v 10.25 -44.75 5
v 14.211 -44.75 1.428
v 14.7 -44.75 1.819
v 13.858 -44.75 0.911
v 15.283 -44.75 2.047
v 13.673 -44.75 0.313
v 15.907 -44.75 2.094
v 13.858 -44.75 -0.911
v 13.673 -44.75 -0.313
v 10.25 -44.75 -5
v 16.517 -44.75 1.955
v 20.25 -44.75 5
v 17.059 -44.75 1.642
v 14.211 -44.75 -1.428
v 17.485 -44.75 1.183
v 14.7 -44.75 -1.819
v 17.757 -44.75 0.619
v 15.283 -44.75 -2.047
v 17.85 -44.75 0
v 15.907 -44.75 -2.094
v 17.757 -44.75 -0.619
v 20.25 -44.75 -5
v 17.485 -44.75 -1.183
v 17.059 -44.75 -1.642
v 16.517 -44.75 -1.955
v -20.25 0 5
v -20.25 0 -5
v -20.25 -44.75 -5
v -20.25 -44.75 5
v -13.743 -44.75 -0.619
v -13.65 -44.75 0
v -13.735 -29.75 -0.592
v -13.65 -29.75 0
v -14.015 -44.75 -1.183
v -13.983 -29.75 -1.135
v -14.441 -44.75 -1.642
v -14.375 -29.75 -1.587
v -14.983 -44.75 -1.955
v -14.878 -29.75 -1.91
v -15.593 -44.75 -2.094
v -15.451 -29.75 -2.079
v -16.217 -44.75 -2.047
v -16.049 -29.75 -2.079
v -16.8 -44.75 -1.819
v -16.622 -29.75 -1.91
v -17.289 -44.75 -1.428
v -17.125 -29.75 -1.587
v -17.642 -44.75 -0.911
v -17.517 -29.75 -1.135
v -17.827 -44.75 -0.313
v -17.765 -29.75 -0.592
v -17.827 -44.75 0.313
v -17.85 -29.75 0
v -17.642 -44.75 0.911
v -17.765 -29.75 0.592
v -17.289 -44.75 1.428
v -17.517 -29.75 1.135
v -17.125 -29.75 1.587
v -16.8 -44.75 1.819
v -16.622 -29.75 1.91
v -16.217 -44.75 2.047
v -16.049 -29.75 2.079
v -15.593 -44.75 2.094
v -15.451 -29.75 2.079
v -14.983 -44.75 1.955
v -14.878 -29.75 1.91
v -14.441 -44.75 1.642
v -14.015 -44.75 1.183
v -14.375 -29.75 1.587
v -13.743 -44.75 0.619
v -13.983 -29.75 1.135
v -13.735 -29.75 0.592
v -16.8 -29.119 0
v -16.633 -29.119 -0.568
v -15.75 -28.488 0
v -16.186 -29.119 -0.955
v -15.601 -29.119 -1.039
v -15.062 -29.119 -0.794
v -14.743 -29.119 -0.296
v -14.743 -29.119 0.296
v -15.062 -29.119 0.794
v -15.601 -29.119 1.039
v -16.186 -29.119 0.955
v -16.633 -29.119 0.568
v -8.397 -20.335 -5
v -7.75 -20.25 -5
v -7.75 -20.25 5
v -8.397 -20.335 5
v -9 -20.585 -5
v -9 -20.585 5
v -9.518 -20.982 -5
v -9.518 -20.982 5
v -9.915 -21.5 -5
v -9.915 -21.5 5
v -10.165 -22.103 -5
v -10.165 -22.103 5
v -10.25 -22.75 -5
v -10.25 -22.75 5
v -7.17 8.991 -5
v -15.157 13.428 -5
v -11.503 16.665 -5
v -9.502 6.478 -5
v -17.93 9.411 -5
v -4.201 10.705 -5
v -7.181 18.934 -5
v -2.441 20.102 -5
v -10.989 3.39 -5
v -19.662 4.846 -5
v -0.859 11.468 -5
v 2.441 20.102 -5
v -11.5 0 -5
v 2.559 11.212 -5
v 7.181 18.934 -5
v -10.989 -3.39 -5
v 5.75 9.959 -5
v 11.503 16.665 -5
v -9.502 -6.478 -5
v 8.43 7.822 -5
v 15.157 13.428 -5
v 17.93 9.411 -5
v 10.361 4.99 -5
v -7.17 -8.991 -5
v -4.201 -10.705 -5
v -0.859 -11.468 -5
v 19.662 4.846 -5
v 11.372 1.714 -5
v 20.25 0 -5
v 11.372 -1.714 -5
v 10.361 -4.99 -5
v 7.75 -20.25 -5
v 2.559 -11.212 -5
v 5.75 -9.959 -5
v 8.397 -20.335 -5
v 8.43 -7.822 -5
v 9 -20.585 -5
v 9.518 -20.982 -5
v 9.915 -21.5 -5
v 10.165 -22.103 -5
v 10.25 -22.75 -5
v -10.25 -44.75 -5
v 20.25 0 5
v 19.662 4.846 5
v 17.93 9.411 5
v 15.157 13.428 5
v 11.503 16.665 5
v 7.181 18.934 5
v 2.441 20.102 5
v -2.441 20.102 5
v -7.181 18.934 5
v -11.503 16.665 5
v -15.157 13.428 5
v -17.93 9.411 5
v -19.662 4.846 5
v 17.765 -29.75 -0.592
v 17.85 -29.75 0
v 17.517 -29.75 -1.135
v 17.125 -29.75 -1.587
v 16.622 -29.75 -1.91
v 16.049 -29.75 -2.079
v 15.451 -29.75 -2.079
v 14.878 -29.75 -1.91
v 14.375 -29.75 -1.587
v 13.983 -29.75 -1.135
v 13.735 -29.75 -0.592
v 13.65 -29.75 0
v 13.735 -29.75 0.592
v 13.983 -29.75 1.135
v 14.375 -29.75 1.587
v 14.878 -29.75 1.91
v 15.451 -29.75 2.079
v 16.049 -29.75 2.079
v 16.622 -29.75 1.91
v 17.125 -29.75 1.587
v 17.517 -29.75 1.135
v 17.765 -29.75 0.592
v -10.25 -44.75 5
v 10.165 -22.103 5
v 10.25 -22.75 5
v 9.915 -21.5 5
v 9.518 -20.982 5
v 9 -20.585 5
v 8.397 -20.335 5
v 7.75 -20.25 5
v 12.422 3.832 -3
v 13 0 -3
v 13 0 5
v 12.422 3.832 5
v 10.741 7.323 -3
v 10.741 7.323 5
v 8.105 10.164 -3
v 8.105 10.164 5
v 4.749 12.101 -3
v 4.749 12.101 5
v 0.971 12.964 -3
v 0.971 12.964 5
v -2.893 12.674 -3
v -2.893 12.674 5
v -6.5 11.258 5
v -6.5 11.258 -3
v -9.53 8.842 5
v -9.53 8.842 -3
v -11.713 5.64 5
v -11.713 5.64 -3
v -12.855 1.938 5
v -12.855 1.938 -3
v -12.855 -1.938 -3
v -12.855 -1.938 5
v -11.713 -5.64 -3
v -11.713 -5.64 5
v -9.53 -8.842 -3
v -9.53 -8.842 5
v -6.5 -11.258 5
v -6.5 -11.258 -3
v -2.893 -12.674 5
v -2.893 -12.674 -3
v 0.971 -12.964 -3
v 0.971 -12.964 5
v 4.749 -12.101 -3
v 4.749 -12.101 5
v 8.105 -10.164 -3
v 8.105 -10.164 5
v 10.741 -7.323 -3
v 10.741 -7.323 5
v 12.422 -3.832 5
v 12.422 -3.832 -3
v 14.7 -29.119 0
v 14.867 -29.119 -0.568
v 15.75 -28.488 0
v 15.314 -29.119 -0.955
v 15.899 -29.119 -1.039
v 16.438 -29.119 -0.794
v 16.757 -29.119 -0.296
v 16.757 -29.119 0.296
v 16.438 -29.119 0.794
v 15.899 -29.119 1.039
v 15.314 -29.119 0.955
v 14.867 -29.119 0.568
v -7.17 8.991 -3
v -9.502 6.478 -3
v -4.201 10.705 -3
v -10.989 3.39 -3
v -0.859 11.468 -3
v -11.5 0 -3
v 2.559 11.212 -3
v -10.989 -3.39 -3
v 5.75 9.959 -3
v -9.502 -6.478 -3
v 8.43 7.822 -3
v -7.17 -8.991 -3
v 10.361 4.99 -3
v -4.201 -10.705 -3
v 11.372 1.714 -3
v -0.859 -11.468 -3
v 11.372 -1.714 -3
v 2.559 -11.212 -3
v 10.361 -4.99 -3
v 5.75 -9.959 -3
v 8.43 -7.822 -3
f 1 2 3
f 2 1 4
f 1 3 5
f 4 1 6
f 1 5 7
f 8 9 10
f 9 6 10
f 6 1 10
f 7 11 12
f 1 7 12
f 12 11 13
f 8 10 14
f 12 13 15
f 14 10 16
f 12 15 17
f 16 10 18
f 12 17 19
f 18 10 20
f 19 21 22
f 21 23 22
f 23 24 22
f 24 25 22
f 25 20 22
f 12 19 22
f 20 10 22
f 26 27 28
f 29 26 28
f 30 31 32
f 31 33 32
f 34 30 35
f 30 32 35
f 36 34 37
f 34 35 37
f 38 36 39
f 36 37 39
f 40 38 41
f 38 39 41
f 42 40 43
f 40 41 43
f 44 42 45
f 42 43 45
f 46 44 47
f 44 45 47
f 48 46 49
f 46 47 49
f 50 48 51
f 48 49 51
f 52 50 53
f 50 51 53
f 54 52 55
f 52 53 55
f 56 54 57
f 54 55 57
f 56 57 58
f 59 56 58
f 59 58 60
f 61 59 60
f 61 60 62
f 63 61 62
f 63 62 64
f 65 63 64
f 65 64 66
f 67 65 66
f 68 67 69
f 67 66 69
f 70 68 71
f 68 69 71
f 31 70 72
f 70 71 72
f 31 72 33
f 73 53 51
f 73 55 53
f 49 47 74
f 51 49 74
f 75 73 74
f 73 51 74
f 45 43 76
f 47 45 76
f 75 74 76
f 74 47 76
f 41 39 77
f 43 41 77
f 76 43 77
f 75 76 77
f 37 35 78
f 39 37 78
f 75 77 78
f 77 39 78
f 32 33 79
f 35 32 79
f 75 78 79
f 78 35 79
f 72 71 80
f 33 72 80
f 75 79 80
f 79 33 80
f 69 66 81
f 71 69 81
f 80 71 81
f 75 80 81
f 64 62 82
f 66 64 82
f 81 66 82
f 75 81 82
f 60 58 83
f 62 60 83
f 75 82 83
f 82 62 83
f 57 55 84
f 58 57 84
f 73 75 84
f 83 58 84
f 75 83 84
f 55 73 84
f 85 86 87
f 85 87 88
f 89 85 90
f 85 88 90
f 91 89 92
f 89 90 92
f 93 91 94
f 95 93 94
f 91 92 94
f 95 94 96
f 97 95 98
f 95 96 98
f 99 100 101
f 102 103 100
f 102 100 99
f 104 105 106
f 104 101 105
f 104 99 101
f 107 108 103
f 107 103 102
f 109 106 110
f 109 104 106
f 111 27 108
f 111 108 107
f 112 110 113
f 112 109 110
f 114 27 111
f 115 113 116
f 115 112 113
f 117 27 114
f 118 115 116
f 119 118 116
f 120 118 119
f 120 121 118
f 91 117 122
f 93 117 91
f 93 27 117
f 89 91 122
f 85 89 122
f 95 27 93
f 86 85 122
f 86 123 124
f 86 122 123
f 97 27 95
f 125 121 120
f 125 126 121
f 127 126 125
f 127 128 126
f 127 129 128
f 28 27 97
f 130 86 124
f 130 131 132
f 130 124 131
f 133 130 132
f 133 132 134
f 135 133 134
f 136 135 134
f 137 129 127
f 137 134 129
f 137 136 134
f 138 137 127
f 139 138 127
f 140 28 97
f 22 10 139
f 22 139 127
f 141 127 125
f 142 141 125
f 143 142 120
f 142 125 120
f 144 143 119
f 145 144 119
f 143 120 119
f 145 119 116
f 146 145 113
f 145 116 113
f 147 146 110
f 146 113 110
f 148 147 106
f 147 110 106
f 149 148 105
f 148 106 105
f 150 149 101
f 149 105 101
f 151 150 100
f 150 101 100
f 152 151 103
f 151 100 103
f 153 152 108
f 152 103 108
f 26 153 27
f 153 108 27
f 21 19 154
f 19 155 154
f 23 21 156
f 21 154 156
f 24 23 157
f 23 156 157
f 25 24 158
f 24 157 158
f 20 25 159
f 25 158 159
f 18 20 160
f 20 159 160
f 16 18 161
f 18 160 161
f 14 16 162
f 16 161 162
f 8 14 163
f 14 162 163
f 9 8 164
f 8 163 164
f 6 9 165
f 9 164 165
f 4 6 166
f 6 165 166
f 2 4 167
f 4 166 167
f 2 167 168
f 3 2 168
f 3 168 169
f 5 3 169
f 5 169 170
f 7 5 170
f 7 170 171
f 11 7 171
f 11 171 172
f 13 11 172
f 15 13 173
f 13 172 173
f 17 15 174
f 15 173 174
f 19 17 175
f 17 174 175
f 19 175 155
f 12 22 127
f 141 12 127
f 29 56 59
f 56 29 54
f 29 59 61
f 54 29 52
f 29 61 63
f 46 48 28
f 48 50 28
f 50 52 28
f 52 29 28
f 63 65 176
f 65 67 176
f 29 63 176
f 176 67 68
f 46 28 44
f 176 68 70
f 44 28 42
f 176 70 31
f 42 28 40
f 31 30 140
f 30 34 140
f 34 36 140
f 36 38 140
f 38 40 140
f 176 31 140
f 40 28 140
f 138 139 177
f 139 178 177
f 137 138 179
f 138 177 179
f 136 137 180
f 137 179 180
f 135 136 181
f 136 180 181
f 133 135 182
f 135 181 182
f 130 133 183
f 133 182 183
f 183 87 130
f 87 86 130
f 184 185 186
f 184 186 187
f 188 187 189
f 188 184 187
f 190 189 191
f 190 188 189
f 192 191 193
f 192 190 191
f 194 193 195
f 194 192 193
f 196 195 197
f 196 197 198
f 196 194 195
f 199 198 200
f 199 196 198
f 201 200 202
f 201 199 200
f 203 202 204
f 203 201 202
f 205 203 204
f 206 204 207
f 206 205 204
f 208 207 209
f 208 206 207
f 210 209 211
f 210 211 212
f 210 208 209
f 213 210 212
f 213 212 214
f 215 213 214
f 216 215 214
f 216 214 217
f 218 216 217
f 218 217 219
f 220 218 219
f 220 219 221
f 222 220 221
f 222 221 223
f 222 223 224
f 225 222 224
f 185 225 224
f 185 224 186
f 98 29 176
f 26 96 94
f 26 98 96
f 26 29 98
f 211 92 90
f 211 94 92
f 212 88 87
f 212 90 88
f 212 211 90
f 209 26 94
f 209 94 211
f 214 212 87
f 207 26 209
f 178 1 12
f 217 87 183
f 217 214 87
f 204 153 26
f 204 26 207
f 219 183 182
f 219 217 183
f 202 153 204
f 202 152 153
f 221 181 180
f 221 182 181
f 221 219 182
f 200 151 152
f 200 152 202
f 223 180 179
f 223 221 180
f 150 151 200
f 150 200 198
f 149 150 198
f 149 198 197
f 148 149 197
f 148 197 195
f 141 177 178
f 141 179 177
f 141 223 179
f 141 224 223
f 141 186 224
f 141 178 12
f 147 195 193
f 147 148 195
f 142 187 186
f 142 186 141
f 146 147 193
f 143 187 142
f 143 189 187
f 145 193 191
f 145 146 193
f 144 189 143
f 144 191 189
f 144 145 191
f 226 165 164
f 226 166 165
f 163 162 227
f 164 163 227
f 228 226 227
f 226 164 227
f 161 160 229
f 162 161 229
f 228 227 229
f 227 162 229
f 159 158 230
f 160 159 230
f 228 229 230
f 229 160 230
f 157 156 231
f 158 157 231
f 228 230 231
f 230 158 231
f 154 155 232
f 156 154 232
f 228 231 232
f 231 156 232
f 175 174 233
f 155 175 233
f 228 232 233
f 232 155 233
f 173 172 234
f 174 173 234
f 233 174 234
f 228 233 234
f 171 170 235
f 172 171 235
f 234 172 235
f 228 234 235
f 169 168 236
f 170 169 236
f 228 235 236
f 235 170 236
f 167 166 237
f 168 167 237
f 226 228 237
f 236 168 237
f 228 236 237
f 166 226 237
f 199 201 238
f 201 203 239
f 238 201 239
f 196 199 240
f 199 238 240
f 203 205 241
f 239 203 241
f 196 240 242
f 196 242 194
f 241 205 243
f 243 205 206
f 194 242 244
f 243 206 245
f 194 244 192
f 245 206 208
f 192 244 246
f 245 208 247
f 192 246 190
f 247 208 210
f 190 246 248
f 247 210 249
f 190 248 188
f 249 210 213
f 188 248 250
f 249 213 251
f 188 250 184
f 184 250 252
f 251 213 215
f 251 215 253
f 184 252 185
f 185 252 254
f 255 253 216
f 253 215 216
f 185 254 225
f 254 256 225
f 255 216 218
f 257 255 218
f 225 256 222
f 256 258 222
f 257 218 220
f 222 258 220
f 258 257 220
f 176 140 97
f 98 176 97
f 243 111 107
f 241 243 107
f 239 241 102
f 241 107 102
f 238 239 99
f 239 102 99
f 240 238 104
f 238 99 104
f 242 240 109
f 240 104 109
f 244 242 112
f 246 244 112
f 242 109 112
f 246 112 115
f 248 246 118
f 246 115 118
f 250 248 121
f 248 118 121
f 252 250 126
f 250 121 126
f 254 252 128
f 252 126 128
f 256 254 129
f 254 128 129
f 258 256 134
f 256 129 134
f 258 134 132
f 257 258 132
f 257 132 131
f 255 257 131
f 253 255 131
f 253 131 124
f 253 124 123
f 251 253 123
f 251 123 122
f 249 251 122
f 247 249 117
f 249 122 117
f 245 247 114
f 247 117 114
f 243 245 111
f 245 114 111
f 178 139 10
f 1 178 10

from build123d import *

# Parameters (mm, degrees)
BOSS_EXTRUDE1_DEPTH       = 5
BOSS_EXTRUDE1_DEPTH_BACK  = 5
SKETCH1_R                 = 13
SKETCH2_R                 = 13
SKETCH2_R_2               = 11.5
BOSS_EXTRUDE2_DEPTH       = 2
M5X0_8_TAPPED_HOLE1_D     = 4.2
M5X0_8_TAPPED_HOLE1_DEPTH = 15
M5X0_8_TAPPED_HOLE1_TIP   = 1.2618073
FILLET1_R                 = 2.5


with BuildPart() as part:
    # Sketch1 → Boss-Extrude1 (new, two sides: drawn at the far end of the back side and taken through both)
    with BuildSketch(Plane.XY.offset(-BOSS_EXTRUDE1_DEPTH_BACK)):
        with BuildLine():
            Line((-10.25, -20.25), (10.25, -20.25))
            Line((10.25, -20.25), (10.25, -44.75))
            Line((10.25, -44.75), (20.25, -44.75))
            Line((20.25, -44.75), (20.25, 0))
            ThreePointArc((20.25, 0), (0, 20.25), (-20.25, 0))
            Line((-20.25, 0), (-20.25, -44.75))
            Line((-20.25, -44.75), (-10.25, -44.75))
            Line((-10.25, -44.75), (-10.25, -20.25))
        make_face()
        Circle(SKETCH1_R, mode=Mode.SUBTRACT)
    extrude(amount=BOSS_EXTRUDE1_DEPTH + BOSS_EXTRUDE1_DEPTH_BACK)

    # Sketch2 → Boss-Extrude2 (add)
    with BuildSketch(Plane(origin=(0, 0, -5), x_dir=(-1, 0, 0), z_dir=(0, 0, -1))):
        Circle(SKETCH2_R)
        Circle(SKETCH2_R_2, mode=Mode.SUBTRACT)
    extrude(amount=-BOSS_EXTRUDE2_DEPTH)

    # M5x0.8 Tapped Hole1
    with Locations(Plane(origin=(0, -44.75, 0), x_dir=(-1, 0, 0), z_dir=(0, -1, 0))):
        with Locations((15.75, 0), (-15.75, 0)):
            Hole(M5X0_8_TAPPED_HOLE1_D / 2, depth=M5X0_8_TAPPED_HOLE1_DEPTH)
            with Locations((0, 0, -(M5X0_8_TAPPED_HOLE1_DEPTH + M5X0_8_TAPPED_HOLE1_TIP / 2))):  # 118° drill point
                Cone(0, M5X0_8_TAPPED_HOLE1_D / 2, M5X0_8_TAPPED_HOLE1_TIP, mode=Mode.SUBTRACT)

    # Fillet1
    fillet1_edges = [part.edges().sort_by_distance(p)[0] for p in [
        (10.25, -20.25, 0),
        (-10.25, -20.25, 0),
    ]]
    fillet(fillet1_edges, radius=FILLET1_R)


solid = part.part
